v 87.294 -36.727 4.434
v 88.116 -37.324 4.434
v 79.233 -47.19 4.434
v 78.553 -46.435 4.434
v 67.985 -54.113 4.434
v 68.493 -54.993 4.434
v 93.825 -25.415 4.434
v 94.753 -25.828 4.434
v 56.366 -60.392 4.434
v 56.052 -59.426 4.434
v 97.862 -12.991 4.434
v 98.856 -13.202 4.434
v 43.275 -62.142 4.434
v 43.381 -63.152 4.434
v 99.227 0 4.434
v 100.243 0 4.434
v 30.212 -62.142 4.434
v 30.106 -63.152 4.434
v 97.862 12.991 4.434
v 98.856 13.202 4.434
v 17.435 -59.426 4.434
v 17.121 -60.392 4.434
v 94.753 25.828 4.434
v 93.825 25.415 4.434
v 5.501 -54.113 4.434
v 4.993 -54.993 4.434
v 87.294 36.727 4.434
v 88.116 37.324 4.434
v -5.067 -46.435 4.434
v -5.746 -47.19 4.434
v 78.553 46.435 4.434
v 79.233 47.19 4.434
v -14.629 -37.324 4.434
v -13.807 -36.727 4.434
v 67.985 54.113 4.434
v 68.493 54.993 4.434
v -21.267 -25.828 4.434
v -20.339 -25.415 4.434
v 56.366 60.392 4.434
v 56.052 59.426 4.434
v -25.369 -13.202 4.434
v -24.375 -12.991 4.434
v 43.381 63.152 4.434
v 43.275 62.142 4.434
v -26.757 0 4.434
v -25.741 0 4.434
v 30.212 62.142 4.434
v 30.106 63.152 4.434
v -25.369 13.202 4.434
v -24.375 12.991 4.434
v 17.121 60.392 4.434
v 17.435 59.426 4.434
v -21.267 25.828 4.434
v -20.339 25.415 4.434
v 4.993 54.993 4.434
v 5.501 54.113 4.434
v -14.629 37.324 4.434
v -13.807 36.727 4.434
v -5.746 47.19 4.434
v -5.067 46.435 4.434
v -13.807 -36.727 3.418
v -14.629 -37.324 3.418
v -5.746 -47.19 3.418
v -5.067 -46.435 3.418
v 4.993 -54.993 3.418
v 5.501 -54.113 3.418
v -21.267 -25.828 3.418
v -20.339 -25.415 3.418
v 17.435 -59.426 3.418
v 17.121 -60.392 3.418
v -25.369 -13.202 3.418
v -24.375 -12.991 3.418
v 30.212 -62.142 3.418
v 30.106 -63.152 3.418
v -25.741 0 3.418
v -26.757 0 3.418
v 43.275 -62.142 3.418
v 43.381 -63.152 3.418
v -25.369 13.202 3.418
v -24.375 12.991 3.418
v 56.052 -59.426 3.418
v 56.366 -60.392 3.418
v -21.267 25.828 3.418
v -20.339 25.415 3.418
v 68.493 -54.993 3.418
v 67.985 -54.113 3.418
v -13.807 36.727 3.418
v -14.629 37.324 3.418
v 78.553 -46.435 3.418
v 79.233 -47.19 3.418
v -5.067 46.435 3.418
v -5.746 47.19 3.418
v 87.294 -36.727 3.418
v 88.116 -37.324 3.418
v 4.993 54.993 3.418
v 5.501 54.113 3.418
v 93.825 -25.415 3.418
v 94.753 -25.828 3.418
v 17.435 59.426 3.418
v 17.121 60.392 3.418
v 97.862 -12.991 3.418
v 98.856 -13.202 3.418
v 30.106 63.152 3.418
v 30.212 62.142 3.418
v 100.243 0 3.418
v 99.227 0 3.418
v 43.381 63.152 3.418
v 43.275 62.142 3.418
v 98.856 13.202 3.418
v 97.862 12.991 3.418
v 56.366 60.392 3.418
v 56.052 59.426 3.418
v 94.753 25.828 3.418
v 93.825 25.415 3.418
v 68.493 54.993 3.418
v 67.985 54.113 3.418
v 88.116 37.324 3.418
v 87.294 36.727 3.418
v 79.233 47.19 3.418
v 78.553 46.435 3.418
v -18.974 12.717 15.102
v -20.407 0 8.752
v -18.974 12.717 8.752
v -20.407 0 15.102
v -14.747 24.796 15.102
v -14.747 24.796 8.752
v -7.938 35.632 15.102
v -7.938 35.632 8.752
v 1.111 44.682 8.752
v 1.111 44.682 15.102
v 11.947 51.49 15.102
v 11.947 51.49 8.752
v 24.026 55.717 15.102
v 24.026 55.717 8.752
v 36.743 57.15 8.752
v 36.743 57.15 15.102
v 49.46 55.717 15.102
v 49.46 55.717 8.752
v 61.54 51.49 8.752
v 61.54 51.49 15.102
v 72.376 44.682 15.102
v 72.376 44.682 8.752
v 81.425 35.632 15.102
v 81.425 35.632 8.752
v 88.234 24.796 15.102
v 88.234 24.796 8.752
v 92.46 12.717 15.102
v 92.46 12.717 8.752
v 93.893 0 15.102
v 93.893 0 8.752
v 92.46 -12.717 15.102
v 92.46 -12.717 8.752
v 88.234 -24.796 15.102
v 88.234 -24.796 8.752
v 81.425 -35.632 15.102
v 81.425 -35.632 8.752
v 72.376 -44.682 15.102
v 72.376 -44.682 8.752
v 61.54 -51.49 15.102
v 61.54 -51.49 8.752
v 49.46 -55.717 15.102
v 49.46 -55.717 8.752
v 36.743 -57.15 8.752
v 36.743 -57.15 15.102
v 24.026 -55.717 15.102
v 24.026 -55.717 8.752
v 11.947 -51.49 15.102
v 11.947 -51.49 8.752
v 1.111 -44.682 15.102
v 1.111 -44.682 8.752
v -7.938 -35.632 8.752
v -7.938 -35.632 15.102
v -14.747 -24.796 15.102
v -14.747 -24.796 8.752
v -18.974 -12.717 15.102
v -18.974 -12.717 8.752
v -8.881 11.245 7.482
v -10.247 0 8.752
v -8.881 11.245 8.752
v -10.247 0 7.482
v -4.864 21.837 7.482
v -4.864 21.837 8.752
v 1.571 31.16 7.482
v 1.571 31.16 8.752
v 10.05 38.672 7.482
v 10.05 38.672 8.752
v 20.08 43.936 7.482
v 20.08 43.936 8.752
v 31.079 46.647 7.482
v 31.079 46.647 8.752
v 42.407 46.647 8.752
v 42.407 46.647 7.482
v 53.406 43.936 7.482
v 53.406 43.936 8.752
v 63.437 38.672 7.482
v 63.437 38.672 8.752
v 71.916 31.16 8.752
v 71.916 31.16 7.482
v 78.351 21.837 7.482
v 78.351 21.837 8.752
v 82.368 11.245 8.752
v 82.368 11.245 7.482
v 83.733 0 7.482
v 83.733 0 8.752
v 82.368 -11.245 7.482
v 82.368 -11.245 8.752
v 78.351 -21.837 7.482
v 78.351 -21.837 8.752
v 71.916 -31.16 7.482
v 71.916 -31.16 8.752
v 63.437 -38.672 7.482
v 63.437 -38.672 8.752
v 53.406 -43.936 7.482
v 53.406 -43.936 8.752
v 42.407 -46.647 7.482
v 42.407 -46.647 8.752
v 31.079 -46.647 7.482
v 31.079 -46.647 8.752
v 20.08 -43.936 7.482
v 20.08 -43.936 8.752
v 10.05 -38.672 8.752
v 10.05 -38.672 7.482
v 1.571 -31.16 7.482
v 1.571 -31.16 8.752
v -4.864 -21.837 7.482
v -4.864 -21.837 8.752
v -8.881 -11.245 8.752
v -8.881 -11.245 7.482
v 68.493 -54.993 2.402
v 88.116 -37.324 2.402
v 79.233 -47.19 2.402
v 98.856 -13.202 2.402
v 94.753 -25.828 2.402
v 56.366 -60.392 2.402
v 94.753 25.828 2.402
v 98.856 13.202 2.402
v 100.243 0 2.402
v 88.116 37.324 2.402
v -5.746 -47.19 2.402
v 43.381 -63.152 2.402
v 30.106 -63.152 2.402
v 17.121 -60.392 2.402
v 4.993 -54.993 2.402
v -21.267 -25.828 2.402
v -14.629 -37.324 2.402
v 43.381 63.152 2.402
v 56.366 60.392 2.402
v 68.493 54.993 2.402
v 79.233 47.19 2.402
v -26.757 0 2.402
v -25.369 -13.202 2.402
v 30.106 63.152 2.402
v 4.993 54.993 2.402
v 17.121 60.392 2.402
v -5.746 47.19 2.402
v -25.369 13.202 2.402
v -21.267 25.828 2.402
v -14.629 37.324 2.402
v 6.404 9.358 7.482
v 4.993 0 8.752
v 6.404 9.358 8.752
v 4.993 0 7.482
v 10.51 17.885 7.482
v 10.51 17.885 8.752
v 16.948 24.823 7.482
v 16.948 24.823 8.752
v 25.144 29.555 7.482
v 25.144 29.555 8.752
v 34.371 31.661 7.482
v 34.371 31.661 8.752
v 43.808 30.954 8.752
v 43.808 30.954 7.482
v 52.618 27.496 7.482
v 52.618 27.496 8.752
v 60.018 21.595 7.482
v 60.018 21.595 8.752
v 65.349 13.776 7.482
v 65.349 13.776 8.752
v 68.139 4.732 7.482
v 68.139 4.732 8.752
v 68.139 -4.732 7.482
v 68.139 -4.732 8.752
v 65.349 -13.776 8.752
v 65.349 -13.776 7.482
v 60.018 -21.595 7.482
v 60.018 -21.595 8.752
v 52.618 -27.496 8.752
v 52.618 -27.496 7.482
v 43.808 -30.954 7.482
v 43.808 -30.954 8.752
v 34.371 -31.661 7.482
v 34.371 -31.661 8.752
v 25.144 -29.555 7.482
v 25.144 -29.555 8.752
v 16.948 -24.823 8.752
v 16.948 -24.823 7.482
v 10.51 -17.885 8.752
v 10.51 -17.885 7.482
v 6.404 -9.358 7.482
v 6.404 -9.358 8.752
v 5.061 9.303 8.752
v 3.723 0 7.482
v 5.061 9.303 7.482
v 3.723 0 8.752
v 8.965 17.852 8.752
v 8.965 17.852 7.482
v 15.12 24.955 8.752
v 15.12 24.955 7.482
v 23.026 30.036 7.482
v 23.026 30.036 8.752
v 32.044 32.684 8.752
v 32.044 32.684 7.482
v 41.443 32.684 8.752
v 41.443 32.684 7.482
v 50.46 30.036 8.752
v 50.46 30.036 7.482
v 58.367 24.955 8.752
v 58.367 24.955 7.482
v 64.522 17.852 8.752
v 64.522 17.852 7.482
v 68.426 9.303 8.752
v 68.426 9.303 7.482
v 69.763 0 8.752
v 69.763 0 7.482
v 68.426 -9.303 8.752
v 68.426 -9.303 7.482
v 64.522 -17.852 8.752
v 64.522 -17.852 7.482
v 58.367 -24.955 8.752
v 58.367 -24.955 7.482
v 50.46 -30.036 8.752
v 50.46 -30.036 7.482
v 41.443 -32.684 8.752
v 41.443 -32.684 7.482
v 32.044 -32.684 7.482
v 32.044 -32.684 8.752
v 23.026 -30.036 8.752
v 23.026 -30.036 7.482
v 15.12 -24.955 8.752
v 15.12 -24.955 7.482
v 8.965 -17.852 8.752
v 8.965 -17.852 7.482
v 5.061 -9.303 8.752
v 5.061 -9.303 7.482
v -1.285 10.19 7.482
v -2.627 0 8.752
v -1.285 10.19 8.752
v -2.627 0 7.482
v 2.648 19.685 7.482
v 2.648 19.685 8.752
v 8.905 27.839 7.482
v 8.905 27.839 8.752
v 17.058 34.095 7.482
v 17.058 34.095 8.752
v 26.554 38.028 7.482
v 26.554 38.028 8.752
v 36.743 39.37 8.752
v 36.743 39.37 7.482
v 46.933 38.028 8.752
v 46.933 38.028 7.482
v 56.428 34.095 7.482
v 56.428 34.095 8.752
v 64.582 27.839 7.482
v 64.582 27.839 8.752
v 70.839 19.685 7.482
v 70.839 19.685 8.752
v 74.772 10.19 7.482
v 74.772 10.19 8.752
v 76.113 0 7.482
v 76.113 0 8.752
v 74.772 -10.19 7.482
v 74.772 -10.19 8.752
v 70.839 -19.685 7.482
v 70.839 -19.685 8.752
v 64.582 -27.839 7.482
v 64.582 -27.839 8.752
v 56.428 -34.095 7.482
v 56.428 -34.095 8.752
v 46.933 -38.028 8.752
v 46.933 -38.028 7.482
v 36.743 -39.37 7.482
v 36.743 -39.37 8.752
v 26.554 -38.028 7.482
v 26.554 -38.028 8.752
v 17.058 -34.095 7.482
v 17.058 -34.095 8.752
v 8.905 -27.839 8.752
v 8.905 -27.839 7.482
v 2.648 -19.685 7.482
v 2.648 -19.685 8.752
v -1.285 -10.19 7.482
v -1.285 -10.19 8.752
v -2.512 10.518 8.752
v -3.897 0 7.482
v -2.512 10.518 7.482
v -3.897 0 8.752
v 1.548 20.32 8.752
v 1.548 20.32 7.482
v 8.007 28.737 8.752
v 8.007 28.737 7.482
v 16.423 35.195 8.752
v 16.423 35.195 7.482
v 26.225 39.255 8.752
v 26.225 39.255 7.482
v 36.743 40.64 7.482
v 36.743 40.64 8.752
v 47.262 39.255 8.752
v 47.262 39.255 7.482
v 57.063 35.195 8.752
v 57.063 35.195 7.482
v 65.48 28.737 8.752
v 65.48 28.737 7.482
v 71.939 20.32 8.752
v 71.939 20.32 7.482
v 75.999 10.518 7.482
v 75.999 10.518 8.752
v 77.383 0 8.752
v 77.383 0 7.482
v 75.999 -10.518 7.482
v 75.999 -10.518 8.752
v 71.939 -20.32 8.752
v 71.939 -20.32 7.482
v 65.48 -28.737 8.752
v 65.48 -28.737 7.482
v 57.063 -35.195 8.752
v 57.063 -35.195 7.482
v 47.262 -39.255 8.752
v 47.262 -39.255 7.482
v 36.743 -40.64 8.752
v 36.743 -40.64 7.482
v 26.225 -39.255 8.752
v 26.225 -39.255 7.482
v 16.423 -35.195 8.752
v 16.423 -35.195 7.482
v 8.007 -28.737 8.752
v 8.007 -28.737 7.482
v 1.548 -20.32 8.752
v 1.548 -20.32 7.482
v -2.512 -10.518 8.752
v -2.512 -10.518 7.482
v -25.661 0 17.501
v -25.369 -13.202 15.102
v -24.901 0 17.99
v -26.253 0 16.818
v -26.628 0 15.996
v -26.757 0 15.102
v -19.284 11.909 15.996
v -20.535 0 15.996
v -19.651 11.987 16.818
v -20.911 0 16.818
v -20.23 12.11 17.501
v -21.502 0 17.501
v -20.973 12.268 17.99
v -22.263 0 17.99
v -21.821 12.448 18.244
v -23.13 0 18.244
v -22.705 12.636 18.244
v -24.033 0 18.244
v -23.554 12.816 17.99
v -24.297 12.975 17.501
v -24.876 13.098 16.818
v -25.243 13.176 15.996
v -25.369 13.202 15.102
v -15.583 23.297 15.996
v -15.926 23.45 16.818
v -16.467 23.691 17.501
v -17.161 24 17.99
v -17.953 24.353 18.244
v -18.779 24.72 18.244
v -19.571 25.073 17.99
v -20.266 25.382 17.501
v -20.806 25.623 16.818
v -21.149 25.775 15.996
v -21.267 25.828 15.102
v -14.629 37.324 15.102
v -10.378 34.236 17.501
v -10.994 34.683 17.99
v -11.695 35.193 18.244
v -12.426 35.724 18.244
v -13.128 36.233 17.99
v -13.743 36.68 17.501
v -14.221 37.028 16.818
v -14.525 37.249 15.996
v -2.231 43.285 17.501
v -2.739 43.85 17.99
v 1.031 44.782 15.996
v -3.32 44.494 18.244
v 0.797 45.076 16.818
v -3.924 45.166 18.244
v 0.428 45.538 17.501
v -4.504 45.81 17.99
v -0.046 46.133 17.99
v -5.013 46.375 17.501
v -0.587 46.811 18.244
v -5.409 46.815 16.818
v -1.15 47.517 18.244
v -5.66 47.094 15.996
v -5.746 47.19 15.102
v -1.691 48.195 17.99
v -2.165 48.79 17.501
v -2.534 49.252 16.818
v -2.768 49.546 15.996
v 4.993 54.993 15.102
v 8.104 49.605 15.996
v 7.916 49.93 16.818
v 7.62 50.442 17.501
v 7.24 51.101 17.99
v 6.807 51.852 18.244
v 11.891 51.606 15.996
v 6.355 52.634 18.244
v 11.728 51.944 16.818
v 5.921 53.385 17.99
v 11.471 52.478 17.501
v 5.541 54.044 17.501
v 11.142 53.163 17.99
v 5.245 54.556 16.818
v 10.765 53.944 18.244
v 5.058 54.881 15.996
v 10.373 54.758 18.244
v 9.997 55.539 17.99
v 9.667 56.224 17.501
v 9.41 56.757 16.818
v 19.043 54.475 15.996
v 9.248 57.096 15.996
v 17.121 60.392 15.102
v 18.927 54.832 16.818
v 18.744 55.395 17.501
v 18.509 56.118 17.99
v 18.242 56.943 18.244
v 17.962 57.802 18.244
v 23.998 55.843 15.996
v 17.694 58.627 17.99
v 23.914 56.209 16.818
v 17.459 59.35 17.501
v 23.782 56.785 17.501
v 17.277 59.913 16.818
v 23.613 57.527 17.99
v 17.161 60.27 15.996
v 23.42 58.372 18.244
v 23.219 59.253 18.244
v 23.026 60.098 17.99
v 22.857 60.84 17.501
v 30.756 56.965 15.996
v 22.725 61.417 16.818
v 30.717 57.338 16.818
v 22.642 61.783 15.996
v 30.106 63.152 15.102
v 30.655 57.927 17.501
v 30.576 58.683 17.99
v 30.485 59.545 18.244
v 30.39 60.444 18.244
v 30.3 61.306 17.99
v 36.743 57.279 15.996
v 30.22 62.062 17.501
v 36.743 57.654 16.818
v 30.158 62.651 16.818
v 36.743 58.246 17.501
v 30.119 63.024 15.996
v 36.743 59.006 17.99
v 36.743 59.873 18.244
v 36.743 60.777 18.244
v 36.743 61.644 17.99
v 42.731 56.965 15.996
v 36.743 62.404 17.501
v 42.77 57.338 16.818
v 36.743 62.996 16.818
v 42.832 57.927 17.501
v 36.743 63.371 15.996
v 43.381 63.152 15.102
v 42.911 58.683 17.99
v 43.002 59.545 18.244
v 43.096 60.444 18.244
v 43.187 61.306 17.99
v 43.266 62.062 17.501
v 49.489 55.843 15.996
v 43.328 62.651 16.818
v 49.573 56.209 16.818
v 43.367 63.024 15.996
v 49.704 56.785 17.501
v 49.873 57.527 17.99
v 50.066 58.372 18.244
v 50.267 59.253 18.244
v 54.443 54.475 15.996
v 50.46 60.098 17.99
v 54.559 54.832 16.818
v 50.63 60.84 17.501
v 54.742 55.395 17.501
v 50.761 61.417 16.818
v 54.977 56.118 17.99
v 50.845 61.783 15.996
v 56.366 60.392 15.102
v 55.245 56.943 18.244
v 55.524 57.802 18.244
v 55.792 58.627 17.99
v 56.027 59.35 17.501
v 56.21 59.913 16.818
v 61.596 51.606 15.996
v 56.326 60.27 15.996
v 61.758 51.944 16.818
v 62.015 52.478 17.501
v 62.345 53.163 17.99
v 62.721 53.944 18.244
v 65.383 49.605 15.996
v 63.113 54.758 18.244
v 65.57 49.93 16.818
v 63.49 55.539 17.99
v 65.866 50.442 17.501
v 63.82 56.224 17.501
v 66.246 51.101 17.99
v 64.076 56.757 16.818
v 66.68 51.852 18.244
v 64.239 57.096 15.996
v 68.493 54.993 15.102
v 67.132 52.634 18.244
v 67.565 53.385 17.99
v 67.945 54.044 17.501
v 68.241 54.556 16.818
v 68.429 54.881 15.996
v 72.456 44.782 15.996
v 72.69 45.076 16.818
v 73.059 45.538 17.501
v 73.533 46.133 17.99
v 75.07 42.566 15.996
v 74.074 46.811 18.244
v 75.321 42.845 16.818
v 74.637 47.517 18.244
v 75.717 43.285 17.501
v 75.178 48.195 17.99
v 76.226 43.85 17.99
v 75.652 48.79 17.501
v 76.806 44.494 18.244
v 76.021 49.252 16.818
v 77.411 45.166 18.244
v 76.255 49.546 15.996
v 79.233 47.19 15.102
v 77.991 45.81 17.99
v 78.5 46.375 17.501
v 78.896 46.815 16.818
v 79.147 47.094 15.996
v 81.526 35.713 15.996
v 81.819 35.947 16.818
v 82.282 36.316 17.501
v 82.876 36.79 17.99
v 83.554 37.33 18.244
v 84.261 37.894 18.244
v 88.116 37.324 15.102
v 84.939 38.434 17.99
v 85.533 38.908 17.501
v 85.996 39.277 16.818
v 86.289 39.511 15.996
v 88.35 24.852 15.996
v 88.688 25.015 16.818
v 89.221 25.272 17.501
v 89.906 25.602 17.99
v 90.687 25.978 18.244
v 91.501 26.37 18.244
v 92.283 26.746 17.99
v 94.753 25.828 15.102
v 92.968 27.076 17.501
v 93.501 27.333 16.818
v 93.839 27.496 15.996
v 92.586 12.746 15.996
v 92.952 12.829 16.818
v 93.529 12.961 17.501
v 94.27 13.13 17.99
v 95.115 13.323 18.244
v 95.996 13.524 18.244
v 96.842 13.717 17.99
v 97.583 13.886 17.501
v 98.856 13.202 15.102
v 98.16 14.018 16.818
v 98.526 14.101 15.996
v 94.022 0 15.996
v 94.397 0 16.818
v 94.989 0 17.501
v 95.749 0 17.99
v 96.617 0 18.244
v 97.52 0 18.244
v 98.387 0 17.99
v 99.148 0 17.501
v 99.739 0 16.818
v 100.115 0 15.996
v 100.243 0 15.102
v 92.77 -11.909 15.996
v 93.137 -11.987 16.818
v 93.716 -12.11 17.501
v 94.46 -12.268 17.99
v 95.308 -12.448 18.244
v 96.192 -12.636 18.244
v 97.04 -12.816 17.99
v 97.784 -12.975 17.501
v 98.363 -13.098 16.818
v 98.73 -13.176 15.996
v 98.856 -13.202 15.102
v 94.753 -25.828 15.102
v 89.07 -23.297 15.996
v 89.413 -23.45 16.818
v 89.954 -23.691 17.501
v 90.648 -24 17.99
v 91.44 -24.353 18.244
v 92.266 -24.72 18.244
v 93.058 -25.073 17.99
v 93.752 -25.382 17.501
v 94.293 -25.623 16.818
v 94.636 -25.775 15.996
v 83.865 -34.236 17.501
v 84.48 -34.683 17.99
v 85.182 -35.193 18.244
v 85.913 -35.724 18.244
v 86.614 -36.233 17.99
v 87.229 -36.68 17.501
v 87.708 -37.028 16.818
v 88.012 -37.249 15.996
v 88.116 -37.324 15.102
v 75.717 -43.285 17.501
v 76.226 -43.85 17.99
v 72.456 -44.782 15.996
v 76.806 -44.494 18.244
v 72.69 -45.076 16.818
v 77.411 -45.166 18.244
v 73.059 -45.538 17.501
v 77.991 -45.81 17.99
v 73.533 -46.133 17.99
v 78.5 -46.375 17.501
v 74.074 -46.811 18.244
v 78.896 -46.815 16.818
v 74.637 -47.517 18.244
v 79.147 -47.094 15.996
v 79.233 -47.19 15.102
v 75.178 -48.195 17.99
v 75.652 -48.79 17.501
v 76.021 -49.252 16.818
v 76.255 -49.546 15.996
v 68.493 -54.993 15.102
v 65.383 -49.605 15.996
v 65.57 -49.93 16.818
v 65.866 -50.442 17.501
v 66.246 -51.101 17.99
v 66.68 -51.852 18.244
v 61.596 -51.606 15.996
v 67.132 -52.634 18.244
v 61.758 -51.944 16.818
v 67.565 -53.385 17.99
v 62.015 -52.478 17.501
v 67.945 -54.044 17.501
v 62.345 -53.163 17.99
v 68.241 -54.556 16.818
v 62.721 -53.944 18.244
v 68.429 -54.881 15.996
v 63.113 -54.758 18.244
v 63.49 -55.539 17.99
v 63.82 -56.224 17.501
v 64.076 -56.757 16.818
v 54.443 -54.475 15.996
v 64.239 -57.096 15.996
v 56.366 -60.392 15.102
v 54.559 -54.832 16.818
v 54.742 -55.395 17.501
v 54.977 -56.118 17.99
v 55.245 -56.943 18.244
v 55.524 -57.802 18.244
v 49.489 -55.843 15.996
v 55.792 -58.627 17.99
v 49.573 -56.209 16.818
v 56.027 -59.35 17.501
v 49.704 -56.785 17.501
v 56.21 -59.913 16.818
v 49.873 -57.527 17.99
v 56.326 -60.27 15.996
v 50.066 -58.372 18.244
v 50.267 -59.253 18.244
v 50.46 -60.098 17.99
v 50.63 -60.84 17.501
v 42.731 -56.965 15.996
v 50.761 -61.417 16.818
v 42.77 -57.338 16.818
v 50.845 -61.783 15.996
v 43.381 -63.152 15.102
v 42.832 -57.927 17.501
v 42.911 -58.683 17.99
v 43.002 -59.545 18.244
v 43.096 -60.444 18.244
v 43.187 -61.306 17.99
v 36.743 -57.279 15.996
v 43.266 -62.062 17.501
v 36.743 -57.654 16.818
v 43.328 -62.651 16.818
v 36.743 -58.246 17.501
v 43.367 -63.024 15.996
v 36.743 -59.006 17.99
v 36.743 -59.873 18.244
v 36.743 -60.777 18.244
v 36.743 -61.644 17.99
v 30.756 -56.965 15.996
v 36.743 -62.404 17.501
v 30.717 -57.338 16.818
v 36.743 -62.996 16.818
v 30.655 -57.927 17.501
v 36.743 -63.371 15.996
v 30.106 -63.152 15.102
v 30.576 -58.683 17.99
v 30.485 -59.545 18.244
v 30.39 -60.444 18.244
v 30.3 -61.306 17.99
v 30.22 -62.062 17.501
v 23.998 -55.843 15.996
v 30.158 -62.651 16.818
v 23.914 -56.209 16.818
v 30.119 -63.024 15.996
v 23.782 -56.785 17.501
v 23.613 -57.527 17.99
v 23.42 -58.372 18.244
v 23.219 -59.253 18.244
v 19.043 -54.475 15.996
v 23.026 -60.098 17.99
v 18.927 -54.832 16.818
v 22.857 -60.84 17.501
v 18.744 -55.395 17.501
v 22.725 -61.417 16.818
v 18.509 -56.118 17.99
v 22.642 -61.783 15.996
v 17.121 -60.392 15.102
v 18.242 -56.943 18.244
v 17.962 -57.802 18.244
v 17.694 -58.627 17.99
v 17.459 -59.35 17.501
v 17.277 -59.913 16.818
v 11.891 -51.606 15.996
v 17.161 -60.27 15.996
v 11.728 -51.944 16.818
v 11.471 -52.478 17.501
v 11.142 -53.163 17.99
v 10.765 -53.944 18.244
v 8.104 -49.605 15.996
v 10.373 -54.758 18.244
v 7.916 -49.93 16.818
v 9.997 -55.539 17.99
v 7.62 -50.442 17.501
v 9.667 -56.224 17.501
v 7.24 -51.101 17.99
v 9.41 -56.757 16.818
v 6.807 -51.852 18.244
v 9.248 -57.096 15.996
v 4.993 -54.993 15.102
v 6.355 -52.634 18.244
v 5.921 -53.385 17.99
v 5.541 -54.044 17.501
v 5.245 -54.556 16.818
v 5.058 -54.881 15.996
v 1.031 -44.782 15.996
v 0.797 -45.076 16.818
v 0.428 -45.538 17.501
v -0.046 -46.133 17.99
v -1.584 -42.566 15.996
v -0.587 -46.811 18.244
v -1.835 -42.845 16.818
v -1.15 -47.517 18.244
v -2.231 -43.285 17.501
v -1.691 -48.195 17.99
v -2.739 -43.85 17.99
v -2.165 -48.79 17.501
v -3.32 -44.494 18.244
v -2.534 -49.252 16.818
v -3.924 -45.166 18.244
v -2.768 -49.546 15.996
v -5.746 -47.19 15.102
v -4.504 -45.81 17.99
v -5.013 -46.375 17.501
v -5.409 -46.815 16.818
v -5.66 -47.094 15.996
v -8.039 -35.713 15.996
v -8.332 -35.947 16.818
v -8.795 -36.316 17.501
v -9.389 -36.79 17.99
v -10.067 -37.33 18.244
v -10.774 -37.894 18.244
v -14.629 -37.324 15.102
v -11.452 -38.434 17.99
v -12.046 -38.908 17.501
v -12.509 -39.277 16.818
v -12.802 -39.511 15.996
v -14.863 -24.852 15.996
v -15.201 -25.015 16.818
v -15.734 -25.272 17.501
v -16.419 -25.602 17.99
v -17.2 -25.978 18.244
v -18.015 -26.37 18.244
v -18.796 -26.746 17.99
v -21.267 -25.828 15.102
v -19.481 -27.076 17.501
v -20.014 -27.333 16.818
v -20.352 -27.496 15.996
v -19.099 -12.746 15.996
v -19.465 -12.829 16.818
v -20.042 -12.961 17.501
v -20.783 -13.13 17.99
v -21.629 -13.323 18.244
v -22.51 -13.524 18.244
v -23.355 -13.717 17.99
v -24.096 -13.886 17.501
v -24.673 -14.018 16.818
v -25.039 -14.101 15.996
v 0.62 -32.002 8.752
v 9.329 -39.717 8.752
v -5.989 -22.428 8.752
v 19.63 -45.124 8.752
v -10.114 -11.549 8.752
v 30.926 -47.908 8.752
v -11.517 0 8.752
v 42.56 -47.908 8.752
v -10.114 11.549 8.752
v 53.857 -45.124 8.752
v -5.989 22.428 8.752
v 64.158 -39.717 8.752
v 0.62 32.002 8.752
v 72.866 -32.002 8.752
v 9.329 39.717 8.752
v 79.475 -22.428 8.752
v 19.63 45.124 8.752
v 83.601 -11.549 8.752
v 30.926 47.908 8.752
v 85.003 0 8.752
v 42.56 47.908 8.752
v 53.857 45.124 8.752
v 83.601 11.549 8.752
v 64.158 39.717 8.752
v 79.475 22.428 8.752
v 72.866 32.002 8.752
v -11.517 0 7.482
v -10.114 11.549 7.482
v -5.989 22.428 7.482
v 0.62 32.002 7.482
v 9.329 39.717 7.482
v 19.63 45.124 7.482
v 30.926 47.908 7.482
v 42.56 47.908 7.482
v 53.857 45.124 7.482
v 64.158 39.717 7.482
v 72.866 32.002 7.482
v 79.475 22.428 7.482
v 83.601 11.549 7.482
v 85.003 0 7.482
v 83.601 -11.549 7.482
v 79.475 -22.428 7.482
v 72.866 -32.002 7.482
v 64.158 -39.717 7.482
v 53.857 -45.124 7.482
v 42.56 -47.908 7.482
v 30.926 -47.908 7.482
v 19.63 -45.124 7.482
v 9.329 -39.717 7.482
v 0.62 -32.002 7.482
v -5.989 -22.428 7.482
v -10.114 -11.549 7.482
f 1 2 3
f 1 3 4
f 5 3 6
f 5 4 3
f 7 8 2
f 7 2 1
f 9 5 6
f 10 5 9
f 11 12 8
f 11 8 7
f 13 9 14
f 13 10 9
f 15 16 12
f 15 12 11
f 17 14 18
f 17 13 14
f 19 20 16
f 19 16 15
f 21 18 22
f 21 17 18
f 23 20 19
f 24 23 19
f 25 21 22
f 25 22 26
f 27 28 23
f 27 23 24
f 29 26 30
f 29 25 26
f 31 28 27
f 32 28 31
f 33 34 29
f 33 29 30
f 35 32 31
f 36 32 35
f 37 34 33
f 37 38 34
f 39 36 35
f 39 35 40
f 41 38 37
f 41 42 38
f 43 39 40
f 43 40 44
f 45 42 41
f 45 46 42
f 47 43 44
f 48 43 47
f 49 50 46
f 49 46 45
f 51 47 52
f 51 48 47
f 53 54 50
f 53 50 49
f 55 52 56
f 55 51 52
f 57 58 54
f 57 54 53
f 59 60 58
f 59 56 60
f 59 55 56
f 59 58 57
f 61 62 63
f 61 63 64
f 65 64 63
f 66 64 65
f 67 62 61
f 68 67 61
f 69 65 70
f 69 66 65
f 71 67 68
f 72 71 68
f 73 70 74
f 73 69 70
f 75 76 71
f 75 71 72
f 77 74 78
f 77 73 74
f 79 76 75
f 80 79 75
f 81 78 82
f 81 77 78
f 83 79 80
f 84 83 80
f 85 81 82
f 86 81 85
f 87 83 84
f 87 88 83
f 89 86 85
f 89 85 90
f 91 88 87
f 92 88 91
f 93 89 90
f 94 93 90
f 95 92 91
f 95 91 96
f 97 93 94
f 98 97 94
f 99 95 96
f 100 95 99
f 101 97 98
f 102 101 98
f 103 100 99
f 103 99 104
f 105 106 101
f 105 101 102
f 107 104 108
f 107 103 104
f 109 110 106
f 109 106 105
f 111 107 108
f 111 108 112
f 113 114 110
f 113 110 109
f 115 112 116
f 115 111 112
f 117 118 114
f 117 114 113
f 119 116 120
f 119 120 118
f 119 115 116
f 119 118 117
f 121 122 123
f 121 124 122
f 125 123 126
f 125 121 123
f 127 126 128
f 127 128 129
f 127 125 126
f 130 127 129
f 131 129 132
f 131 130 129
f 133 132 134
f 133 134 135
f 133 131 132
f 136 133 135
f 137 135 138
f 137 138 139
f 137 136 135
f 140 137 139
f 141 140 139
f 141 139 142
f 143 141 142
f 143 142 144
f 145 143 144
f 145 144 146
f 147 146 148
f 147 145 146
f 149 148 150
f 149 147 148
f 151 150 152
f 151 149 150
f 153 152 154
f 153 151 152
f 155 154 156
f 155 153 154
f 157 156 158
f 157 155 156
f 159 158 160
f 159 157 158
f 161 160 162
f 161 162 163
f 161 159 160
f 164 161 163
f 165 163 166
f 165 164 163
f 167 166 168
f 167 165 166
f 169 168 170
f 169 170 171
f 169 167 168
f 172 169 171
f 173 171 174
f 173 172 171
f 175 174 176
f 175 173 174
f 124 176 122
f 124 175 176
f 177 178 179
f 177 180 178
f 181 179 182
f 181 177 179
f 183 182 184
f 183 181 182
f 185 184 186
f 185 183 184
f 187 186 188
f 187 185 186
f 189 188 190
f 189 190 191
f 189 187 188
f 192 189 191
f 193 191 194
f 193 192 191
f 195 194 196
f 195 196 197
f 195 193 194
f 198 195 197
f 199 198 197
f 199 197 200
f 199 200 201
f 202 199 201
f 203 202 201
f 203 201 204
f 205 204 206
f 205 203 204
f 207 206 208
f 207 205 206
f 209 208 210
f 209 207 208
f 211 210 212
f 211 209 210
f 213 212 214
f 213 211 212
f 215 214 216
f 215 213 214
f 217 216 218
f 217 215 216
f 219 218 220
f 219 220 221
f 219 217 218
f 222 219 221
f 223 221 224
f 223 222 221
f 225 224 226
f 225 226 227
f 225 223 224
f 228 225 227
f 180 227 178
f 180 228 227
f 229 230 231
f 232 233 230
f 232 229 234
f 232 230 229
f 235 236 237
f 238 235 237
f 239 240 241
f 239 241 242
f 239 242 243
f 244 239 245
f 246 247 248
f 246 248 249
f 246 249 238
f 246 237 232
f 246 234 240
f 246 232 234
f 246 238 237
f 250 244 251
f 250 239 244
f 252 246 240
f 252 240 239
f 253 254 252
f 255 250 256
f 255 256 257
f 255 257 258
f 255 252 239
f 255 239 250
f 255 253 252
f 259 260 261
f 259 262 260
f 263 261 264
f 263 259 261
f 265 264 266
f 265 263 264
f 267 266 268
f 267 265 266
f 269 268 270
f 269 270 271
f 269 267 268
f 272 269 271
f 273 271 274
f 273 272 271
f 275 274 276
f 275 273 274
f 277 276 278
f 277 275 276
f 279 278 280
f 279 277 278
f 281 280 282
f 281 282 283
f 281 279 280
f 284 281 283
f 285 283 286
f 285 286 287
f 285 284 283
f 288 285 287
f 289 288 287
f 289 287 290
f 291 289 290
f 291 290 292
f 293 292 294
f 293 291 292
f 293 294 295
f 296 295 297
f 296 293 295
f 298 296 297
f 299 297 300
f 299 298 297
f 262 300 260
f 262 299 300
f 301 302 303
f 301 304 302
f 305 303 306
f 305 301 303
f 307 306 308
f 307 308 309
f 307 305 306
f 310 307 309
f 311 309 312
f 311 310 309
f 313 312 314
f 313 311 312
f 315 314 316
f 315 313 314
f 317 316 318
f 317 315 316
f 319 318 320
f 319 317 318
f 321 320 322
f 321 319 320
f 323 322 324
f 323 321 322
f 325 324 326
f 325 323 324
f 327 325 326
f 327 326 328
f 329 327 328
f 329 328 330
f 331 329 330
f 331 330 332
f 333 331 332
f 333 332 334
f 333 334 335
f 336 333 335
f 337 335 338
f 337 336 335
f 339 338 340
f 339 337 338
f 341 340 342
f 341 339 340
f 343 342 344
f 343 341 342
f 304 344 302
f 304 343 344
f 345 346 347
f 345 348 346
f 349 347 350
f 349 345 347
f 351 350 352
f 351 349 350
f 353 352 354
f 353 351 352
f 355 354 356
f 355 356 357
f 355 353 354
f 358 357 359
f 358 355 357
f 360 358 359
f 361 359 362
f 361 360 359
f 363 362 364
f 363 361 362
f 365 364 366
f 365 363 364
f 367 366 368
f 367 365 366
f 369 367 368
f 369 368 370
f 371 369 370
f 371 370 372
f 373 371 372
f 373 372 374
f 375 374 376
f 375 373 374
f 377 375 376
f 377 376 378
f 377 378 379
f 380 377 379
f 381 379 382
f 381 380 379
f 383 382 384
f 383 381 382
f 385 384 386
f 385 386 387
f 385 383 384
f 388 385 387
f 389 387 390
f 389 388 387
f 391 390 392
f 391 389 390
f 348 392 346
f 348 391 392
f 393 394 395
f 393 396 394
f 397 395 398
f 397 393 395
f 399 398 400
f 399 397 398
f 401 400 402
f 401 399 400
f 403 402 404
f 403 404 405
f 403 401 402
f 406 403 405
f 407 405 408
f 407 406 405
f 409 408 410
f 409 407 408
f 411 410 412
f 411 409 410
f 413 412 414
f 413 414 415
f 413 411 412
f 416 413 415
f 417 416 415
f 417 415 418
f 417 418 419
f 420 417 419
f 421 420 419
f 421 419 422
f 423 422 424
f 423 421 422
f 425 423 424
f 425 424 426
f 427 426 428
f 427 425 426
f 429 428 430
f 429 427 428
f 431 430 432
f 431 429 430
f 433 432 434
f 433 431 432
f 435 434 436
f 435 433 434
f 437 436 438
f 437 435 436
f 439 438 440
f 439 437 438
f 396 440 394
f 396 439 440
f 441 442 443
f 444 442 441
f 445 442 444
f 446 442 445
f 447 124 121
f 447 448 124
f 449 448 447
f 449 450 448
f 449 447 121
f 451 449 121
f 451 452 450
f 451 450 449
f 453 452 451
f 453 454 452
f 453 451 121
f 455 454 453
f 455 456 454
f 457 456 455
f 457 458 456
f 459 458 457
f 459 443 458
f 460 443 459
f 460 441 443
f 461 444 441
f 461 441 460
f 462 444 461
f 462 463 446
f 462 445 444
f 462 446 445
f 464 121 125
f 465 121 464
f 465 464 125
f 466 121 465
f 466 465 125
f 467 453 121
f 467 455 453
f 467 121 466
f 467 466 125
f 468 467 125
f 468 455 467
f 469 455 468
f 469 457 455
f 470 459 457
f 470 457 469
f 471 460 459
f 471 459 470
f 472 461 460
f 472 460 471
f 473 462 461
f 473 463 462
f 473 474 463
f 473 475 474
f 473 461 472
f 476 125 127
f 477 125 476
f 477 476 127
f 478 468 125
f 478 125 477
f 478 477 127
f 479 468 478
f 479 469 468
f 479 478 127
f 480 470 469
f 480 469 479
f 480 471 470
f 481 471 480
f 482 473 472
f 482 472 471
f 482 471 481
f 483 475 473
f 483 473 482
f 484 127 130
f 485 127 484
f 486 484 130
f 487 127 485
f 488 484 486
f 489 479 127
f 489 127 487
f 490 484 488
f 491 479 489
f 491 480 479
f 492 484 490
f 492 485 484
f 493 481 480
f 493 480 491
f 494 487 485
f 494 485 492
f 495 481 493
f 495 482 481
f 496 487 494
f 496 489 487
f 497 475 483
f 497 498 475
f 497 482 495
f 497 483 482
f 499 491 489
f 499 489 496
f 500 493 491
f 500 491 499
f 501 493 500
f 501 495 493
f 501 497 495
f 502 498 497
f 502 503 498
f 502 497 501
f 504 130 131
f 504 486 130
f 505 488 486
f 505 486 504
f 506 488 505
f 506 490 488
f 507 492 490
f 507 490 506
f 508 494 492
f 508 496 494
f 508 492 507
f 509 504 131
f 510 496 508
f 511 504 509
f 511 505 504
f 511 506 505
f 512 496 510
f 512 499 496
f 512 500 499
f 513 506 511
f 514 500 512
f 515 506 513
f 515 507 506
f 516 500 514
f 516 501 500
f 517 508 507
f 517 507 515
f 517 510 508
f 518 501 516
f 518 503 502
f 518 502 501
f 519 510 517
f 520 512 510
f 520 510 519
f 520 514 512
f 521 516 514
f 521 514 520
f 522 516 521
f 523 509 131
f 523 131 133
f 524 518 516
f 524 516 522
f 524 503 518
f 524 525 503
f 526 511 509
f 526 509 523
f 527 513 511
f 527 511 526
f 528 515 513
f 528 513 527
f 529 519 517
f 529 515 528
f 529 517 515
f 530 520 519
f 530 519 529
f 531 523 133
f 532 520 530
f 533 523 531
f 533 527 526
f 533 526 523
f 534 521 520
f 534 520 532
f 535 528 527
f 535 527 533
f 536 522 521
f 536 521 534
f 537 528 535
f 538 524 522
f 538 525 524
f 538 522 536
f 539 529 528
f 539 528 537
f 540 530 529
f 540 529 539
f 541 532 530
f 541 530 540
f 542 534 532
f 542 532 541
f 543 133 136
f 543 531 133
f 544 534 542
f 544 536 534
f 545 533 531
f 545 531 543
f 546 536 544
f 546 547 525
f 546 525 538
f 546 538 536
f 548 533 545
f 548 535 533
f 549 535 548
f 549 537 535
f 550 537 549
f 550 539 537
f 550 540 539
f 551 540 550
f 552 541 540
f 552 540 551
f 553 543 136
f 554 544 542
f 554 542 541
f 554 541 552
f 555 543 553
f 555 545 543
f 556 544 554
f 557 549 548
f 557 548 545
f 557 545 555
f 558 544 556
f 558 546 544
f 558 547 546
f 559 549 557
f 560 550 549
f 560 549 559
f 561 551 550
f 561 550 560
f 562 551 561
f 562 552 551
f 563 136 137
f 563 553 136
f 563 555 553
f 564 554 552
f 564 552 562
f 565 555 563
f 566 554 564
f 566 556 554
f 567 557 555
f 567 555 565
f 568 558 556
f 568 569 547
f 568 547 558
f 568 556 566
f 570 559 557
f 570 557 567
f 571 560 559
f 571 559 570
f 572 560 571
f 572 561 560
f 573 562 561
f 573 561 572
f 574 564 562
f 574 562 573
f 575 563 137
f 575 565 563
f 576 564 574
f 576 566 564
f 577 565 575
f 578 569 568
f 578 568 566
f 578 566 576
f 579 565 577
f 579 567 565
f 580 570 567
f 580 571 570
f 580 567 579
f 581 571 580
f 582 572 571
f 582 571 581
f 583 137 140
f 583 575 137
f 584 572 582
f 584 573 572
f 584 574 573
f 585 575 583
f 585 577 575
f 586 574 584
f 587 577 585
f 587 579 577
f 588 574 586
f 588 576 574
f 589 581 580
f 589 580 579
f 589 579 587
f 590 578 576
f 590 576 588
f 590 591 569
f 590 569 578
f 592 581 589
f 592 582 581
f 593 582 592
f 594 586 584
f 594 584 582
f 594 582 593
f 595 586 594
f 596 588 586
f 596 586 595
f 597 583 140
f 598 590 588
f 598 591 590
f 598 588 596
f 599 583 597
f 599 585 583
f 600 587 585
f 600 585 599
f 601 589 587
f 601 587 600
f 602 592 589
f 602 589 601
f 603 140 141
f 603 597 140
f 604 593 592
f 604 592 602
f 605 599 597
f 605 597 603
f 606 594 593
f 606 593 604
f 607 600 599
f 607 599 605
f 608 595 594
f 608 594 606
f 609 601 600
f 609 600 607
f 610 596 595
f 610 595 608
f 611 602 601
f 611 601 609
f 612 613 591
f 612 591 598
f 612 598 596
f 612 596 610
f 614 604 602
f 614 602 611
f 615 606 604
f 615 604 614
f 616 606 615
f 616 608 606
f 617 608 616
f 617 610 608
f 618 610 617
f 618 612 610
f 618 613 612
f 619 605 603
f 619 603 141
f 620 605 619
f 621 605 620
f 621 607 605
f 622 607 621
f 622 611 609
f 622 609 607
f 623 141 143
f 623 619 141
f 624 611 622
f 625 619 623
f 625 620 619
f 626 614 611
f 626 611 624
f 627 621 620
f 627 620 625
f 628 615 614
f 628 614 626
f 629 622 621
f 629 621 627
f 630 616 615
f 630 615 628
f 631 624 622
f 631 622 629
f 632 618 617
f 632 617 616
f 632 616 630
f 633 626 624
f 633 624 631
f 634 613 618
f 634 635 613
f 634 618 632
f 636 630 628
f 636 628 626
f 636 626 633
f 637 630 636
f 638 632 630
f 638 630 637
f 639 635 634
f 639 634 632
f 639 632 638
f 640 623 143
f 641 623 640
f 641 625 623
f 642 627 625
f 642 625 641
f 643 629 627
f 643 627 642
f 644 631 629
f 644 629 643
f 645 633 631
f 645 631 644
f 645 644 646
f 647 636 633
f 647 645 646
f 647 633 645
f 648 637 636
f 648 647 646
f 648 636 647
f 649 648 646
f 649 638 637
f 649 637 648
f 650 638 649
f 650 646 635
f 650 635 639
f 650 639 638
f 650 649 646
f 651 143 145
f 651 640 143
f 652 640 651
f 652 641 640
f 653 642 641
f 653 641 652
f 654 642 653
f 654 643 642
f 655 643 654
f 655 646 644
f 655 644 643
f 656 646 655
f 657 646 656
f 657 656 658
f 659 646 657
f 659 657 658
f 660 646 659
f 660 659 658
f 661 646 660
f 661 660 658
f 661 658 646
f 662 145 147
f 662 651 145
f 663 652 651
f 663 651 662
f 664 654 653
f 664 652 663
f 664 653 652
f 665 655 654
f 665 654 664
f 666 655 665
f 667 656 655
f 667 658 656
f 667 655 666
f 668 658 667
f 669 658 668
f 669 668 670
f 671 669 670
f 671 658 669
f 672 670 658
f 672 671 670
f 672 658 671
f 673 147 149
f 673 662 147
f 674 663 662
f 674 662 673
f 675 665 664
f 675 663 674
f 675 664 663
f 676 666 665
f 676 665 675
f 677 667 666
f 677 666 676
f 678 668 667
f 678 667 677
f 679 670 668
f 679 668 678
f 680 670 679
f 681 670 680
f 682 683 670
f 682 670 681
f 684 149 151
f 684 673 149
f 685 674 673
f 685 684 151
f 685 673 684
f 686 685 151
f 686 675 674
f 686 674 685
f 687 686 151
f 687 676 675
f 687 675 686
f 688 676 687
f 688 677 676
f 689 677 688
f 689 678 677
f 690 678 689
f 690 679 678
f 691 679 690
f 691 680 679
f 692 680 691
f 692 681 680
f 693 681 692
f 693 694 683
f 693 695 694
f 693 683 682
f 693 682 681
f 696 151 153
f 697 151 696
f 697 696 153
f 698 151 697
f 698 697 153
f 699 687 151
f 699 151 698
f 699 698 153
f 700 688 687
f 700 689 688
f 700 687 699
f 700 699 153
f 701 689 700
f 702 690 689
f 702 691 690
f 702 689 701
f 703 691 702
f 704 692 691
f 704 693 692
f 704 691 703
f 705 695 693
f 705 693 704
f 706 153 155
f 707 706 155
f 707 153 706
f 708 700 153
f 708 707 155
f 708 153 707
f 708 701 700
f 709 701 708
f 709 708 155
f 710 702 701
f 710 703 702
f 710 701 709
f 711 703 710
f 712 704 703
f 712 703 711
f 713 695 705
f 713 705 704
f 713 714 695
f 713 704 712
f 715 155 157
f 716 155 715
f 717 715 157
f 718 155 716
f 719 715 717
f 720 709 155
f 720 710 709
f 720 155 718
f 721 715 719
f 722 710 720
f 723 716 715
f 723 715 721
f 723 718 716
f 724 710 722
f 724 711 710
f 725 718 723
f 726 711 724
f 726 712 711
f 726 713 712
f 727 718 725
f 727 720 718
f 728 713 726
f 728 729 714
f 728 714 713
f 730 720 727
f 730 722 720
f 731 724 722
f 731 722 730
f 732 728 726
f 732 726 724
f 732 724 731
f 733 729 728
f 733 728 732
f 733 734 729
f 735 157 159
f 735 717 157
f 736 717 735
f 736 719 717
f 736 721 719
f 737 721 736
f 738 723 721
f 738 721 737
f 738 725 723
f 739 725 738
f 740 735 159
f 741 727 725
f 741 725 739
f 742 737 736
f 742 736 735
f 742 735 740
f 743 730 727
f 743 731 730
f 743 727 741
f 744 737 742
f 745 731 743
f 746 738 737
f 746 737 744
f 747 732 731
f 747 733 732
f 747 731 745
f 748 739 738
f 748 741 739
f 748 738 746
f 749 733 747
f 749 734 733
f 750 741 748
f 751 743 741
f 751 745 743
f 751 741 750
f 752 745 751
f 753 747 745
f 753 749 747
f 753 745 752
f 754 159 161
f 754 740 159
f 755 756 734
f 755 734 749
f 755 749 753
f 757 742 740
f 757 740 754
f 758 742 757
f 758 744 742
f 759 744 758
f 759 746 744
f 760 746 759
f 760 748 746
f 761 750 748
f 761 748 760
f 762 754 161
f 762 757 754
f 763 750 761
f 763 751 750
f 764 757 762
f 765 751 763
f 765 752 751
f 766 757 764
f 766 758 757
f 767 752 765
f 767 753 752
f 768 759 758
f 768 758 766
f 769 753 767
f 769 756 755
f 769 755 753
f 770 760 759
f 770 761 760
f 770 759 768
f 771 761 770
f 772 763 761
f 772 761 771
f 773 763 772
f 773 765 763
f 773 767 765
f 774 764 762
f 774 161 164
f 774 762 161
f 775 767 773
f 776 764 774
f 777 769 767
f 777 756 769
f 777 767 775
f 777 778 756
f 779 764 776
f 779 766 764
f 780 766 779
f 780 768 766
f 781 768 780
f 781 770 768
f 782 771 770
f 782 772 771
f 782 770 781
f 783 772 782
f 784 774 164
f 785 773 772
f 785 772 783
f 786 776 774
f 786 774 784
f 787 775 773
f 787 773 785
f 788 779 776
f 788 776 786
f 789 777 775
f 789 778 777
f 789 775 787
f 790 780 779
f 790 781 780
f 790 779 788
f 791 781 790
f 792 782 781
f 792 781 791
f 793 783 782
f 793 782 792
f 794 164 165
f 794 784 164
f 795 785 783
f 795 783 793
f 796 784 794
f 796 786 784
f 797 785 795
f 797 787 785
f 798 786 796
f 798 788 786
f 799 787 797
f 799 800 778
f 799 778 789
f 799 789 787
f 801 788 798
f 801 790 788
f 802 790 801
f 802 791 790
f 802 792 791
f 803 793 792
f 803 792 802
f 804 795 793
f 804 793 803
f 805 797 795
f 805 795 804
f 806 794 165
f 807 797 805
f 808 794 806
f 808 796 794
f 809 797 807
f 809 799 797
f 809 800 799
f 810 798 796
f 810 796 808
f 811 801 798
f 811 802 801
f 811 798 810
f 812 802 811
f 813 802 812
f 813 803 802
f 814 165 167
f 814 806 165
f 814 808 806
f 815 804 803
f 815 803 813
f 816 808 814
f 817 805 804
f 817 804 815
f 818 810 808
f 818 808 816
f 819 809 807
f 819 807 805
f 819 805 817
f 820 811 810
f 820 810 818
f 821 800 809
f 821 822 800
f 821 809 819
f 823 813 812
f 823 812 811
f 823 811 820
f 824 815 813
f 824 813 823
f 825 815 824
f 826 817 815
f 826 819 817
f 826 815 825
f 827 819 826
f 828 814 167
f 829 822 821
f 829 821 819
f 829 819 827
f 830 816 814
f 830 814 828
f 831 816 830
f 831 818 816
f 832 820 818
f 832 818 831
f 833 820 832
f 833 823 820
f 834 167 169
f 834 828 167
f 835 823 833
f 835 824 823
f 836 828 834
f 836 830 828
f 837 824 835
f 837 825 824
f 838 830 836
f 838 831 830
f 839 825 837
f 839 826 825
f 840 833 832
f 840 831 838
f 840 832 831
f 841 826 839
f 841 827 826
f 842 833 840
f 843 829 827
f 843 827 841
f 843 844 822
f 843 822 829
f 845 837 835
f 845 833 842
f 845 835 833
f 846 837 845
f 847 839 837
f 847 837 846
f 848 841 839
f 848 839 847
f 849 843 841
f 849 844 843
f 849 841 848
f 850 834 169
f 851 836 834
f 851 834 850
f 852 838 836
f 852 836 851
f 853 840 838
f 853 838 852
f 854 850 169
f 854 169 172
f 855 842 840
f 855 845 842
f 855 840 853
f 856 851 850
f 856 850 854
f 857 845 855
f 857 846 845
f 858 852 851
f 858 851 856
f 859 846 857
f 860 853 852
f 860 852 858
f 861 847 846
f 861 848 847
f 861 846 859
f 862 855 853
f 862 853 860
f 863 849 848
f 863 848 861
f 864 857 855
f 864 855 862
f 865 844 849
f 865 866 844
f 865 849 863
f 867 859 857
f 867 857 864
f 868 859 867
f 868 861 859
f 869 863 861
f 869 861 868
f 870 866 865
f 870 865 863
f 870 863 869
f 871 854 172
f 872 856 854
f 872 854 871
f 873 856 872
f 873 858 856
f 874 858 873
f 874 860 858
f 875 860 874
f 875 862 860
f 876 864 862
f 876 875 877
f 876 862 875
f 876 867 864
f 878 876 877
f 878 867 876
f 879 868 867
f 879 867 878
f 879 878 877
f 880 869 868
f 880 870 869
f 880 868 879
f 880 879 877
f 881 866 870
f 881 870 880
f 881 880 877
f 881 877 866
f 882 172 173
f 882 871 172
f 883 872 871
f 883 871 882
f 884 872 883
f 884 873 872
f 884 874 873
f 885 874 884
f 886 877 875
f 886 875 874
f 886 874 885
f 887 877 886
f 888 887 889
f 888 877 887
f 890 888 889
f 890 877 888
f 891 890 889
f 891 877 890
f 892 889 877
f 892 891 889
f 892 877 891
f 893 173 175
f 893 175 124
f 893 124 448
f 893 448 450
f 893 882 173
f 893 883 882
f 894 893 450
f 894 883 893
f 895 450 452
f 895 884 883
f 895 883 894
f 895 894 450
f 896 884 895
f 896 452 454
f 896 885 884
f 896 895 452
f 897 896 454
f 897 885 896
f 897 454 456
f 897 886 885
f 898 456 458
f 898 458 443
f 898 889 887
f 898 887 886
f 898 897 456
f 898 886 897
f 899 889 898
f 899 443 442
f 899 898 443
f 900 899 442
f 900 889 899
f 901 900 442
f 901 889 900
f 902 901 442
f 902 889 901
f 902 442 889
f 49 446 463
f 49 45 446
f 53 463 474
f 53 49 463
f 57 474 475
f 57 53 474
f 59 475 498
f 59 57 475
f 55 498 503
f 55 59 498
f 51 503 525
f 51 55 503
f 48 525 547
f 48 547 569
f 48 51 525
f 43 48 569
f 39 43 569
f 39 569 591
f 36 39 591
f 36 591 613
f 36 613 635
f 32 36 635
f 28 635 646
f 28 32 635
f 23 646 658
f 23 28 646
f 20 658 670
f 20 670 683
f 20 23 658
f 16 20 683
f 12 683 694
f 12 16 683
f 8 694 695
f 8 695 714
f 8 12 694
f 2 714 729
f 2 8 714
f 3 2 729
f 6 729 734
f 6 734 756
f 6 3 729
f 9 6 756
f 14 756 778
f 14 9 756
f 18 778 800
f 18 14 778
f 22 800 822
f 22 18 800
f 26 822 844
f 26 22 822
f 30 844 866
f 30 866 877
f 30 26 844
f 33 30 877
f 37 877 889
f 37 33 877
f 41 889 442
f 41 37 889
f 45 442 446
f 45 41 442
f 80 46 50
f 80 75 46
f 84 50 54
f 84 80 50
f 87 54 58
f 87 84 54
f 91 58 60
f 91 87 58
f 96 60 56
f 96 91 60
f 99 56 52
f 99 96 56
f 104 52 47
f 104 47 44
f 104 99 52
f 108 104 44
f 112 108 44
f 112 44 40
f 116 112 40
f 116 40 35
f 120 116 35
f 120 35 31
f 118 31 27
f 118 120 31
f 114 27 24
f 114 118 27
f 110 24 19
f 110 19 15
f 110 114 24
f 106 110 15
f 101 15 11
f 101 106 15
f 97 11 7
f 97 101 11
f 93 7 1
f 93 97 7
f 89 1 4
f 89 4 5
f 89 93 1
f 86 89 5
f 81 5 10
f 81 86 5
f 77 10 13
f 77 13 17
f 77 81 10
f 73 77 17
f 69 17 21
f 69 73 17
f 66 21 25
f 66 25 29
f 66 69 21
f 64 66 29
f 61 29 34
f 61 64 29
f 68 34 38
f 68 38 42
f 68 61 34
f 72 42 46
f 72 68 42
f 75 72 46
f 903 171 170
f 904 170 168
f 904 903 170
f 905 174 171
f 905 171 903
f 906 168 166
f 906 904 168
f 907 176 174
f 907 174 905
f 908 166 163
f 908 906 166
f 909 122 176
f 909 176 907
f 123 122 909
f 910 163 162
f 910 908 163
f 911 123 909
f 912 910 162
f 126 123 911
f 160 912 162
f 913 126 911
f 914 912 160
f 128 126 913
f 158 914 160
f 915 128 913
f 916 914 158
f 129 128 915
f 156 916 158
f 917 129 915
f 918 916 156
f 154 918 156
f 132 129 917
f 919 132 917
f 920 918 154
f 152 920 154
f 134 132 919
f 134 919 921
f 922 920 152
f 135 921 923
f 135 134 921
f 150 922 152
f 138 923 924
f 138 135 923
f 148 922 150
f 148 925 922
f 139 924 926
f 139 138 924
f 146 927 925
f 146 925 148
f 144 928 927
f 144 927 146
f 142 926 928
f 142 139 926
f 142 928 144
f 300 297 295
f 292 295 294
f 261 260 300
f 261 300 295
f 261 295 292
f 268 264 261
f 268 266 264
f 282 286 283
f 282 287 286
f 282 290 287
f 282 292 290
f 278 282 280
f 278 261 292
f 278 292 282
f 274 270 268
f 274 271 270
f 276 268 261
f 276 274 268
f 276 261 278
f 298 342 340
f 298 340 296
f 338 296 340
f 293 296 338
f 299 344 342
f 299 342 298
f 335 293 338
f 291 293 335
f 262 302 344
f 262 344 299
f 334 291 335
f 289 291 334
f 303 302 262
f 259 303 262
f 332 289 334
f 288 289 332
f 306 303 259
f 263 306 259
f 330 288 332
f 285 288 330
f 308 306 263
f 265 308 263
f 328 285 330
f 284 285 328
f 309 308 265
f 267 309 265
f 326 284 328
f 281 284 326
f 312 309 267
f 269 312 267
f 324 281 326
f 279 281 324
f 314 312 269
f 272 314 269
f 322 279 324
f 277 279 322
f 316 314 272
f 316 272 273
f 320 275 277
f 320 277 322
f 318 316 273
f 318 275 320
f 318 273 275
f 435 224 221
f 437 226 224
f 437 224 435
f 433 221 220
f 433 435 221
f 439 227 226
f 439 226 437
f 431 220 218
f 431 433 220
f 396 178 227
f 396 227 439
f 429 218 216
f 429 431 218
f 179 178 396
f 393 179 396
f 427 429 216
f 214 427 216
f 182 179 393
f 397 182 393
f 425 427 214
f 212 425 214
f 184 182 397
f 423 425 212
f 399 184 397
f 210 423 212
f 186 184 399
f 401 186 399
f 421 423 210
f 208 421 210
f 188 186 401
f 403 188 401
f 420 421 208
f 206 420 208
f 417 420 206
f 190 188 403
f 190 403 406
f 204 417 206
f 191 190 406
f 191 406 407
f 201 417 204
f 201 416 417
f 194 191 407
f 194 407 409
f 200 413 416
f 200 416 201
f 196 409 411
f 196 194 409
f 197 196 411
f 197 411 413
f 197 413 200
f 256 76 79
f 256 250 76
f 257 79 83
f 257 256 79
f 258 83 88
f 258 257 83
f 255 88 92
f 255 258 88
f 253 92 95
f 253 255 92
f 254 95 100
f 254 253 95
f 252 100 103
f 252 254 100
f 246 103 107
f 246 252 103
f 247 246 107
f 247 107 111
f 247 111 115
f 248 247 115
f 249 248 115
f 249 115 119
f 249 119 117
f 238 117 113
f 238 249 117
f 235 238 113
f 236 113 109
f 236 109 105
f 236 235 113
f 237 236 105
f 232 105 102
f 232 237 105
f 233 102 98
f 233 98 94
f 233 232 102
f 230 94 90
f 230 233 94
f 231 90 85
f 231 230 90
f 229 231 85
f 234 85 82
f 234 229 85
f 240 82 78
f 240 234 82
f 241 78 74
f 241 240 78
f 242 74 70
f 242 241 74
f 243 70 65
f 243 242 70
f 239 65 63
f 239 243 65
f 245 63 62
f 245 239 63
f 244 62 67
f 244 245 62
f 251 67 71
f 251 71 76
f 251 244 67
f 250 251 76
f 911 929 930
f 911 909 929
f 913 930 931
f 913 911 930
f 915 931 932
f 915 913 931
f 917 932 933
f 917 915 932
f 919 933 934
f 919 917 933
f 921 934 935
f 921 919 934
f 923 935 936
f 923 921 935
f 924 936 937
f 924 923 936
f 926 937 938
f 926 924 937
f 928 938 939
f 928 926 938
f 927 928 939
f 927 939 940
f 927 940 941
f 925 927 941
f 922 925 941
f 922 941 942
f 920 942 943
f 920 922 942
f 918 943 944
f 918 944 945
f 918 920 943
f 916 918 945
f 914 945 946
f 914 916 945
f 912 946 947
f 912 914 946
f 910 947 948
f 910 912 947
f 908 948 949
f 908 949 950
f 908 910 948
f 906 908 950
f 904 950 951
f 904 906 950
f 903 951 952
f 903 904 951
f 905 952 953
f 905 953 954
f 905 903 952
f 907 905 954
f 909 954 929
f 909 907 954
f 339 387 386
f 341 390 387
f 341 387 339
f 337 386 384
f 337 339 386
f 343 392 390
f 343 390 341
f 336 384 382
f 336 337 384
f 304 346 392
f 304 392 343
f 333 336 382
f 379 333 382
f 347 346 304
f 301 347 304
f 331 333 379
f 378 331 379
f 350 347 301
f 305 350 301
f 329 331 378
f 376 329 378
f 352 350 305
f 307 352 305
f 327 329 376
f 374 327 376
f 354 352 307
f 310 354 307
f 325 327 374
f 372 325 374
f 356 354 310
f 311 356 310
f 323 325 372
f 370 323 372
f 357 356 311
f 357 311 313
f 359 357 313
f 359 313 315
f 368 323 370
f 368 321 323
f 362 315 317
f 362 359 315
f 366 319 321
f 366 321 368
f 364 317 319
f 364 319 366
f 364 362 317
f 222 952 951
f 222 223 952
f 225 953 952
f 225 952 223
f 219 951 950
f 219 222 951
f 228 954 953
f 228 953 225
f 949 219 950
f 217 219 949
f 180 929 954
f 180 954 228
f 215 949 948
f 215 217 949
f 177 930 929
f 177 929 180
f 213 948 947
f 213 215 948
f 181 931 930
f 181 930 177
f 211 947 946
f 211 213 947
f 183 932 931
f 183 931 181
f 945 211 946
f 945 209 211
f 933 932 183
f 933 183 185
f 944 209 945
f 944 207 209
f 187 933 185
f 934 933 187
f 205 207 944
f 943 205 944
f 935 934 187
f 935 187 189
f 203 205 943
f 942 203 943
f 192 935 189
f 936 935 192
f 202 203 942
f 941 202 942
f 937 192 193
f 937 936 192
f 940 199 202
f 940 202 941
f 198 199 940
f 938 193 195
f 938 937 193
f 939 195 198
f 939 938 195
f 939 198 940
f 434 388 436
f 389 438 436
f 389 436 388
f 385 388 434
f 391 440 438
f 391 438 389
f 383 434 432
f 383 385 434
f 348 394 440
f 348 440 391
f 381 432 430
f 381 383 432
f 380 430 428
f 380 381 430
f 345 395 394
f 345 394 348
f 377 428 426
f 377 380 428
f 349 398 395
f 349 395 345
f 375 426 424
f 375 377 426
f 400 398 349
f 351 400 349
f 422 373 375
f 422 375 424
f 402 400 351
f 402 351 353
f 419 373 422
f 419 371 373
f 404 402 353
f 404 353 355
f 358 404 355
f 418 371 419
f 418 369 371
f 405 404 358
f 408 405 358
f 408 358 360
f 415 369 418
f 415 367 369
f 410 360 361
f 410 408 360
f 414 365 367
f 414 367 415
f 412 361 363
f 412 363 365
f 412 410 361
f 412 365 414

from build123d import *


with BuildPart() as f1:
    # F0 (on Front) → F1 (revolve)
    with BuildSketch(Plane.XZ):
        with BuildLine():
            Line((36.743357, 2.401563), (36.743357, 8.751563))
            Line((36.743357, 8.751563), (4.993357, 8.751563))
            Line((4.993357, 8.751563), (4.993357, 7.481563))
            Line((4.993357, 7.481563), (3.723357, 7.481563))
            Line((3.723357, 7.481563), (3.723357, 8.751563))
            Line((3.723357, 8.751563), (-2.626643, 8.751563))
            Line((-2.626643, 8.751563), (-2.626643, 7.481563))
            Line((-2.626643, 7.481563), (-3.896643, 7.481563))
            Line((-3.896643, 7.481563), (-3.896643, 8.751563))
            Line((-3.896643, 8.751563), (-10.246643, 8.751563))
            Line((-10.246643, 8.751563), (-10.246643, 7.481563))
            Line((-10.246643, 7.481563), (-11.516643, 7.481563))
            Line((-11.516643, 7.481563), (-11.516643, 8.751563))
            Line((-11.516643, 8.751563), (-20.406643, 8.751563))
            Line((-20.406643, 8.751563), (-20.406643, 15.101563))
            ThreePointArc((-20.406643, 15.101563), (-23.581643, 18.276563), (-26.756643, 15.101563))
            Line((-26.756643, 15.101563), (-26.756643, 4.433563))
            Line((-26.756643, 4.433563), (-25.740643, 4.433563))
            Line((-25.740643, 4.433563), (-25.740643, 3.417563))
            Line((-25.740643, 3.417563), (-26.756643, 3.417563))
            Line((-26.756643, 3.417563), (-26.756643, 2.401563))
            Line((-26.756643, 2.401563), (36.743357, 2.401563))
        make_face()
    revolve(axis=Axis((36.743357, 0, 5.576563), (0, 0, -1)))


solid = f1.part
